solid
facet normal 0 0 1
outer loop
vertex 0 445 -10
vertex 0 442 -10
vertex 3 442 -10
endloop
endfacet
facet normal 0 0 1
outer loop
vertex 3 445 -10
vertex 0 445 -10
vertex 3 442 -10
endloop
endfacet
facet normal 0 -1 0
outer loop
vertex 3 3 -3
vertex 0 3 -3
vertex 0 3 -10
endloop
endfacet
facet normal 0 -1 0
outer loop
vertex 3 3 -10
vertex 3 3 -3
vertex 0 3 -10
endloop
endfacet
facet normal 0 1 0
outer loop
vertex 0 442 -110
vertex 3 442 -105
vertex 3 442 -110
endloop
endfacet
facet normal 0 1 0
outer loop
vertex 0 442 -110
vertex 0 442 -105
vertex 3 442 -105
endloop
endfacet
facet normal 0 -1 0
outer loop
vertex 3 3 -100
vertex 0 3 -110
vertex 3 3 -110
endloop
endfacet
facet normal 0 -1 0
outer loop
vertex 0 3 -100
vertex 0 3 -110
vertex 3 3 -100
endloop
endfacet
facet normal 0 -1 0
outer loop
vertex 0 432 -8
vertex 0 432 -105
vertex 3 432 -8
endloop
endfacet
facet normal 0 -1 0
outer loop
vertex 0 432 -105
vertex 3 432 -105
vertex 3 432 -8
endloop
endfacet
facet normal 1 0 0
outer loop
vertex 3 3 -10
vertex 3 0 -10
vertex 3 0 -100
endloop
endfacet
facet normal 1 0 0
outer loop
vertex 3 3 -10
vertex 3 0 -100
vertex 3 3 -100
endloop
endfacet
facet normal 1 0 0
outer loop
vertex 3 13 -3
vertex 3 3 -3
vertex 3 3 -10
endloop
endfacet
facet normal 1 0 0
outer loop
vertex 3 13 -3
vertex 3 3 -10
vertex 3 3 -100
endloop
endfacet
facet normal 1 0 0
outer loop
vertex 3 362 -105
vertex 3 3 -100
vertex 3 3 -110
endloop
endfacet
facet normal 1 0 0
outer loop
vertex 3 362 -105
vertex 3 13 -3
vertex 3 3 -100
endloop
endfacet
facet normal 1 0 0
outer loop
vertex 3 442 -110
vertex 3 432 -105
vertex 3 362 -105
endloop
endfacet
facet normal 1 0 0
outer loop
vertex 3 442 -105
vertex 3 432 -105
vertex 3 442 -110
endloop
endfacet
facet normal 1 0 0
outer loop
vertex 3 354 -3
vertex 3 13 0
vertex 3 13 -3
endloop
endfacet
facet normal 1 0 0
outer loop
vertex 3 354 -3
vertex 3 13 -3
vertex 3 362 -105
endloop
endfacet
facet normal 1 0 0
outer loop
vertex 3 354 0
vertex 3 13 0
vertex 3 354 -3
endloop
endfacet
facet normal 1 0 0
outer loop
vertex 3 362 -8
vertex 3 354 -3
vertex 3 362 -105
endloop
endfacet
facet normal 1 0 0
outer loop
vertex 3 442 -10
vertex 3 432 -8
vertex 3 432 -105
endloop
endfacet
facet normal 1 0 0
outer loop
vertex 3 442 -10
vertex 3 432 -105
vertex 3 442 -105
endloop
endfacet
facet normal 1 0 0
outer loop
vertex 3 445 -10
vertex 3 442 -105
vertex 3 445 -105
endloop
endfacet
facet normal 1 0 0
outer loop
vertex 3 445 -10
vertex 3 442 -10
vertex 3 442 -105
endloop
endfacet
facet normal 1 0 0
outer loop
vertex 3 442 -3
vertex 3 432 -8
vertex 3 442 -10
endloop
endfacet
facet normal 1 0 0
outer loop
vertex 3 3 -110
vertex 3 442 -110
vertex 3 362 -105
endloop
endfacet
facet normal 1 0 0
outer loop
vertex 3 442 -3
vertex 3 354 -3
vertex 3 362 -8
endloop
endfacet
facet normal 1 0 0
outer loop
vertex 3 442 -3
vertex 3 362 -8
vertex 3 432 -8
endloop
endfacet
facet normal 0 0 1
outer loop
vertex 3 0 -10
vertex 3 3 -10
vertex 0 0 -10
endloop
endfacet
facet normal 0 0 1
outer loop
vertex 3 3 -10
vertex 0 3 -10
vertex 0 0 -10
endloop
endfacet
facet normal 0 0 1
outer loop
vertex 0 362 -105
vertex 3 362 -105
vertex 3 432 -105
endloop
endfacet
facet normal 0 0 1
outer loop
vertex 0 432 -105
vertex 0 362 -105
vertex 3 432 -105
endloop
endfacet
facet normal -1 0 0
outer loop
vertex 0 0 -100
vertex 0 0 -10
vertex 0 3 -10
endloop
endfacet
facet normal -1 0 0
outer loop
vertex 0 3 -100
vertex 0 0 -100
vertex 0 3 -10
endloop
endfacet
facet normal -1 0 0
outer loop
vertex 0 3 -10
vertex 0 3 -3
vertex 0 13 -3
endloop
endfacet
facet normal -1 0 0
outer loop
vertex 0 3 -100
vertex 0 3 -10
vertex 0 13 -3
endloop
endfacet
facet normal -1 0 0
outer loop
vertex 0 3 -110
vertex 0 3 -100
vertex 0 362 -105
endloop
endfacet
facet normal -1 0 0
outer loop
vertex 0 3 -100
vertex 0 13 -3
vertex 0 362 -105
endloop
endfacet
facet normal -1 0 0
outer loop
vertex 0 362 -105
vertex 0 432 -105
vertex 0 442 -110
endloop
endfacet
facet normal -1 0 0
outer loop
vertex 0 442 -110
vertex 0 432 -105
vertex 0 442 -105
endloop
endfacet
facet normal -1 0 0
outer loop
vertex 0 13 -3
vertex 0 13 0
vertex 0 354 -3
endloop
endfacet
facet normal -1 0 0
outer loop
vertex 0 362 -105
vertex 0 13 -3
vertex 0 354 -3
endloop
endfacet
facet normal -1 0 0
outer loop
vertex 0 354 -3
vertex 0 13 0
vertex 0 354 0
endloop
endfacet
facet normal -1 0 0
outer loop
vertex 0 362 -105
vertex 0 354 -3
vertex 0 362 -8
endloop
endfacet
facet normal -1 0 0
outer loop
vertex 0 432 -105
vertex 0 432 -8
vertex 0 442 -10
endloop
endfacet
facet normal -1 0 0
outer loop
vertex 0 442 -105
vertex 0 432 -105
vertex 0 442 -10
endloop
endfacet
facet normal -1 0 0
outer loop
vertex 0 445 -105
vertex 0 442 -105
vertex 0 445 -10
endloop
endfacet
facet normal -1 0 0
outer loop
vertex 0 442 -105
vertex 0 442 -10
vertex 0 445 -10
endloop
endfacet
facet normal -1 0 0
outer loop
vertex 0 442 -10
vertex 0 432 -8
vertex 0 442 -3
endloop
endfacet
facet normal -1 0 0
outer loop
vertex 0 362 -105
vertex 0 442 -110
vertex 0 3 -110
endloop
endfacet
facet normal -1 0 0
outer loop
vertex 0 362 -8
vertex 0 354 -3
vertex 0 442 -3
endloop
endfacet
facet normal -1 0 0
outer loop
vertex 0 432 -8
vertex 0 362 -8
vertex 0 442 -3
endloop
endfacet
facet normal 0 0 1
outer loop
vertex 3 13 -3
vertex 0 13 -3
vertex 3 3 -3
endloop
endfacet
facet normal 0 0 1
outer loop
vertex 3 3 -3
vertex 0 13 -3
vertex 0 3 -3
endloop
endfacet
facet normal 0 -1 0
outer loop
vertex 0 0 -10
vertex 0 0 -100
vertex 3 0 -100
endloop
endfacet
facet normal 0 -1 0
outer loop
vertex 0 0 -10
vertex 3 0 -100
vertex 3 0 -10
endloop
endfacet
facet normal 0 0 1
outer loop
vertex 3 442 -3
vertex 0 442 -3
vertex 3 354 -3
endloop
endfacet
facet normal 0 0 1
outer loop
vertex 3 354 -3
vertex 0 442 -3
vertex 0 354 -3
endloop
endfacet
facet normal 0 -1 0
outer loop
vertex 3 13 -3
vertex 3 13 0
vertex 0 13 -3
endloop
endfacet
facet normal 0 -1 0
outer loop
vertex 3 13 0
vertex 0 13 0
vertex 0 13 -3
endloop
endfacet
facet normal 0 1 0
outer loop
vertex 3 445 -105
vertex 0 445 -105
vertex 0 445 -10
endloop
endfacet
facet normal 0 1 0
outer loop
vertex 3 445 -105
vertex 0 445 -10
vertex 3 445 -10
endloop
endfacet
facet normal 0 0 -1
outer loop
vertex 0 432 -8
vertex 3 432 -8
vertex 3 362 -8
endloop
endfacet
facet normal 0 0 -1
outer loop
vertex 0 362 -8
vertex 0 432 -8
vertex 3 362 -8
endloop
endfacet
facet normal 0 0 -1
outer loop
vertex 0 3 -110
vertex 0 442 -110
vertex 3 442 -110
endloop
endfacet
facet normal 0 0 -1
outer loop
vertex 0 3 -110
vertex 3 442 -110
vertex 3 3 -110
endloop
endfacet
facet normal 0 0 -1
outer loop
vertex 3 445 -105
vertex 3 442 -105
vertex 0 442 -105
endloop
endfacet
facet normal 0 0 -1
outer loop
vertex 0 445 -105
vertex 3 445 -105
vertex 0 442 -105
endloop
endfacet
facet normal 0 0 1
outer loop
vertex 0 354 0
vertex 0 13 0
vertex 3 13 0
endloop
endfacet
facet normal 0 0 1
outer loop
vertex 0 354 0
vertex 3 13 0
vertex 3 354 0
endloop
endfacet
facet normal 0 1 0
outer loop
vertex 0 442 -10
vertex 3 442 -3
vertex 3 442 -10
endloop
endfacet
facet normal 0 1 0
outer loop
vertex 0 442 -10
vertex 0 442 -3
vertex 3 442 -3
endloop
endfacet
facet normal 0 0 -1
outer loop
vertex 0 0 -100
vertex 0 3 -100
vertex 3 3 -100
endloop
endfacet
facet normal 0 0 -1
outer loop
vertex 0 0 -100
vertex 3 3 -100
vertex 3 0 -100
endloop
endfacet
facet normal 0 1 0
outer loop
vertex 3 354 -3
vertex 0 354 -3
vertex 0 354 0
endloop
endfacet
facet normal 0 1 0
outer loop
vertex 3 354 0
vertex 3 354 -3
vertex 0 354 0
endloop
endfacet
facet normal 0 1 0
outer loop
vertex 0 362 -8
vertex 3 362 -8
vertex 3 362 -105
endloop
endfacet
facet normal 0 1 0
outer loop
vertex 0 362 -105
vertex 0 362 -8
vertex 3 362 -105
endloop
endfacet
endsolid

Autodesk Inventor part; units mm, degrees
ref_plane "YZ Plane" through (0, 0, 0) normal (1, 0, 0) x (0, 1, 0)
ref_plane "XZ Plane" through (0, 0, 0) normal (0, 1, 0) x (-1, 0, 0)
ref_plane "XY Plane" through (0, 0, 0) normal (0, 0, 1) x (1, 0, 0)
sketch "Sketch1" plane through (0, 0, 0) normal (1, 0, 0) x (0, 1, 0)
  line L0 (0, 0) -> (442, 0)
  line L1 (442, 0) -> (442, -110)
  line L2 (442, -110) -> (0, -110)
  line L3 (0, -110) -> (0, 0)
  line L4 (3, 0) -> (3, -10)
  line L5 (3, -10) -> (0, -10)
  line L6 (3, -110) -> (3, -100)
  line L7 (3, -100) -> (0, -100)
  line L8 (13, 0) -> (13, -3)
  line L9 (13, -3) -> (3, -3)
  line L10 (442, -3) -> (354, -3)
  line L11 (354, -3) -> (354, 0)
  dimension "d0" = 442
  dimension "d1" = 110
  dimension "d2" = 3
  dimension "d3" = 10
  dimension "d4" = 10
  dimension "d5" = 10
  dimension "d6" = 3
  dimension "d7" = 88
  dimension "d8" = 3
extrude "Extrusion1" add sketch "Sketch1" along normal blind 3 contours L5 L4 L9 L8 L0 L11 L10 L1 L2 L6 L7 L3
sketch "Sketch2" plane through (0, 442, -3) normal (0, 1, 0) x (1, 0, 0)
  line L0 (0, 7) -> (0, 97) projected
  line L1 (0, 7) -> (3, 7)
  line L2 (3, 7) -> (3, 97) projected
  line L3 (0, 7) -> (0, 102)
  line L4 (0, 97) -> (0, 107) projected
  line L5 (3, 97) -> (3, 107) projected
  line L6 (3, 102) -> (0, 102)
  line L7 (3, 102) -> (3, 7)
  line L8 (0, 7) -> (3, 7) projected
  line L9 (0, 107) -> (3, 107) projected
  line L10 (0, 0) -> (3, 0) projected
  point P0 (0, -3)
  point P1 (0, 97)
  dimension "d12" = 5
  dimension "d15" = 7
extrude "Extrusion2" add sketch "Sketch2" along normal blind 3 contours L0 L3 L6 L5 L2 L1
sketch "Sketch3" plane through (3, 0, 0) normal (1, 0, 0) x (0, 0, -1)
  line L0 (8, 432) -> (8, 362)
  line L1 (8, 362) -> (105, 362)
  line L2 (105, 362) -> (105, 432)
  line L3 (105, 432) -> (8, 432)
  line L4 (3, 442) -> (3, 354) projected
  line L5 (110, 3) -> (110, 442) projected
  line L6 (10, 445) -> (105, 445) projected
  point P0 (0, 0)
  dimension "d16" = 5
  dimension "d17" = 5
  dimension "d18" = 70
  dimension "d19" = 13
extrude "Extrusion3" cut sketch "Sketch3" against normal blind 3
properties part number "Lift cover of lifting" material "PMMA Plastic"
